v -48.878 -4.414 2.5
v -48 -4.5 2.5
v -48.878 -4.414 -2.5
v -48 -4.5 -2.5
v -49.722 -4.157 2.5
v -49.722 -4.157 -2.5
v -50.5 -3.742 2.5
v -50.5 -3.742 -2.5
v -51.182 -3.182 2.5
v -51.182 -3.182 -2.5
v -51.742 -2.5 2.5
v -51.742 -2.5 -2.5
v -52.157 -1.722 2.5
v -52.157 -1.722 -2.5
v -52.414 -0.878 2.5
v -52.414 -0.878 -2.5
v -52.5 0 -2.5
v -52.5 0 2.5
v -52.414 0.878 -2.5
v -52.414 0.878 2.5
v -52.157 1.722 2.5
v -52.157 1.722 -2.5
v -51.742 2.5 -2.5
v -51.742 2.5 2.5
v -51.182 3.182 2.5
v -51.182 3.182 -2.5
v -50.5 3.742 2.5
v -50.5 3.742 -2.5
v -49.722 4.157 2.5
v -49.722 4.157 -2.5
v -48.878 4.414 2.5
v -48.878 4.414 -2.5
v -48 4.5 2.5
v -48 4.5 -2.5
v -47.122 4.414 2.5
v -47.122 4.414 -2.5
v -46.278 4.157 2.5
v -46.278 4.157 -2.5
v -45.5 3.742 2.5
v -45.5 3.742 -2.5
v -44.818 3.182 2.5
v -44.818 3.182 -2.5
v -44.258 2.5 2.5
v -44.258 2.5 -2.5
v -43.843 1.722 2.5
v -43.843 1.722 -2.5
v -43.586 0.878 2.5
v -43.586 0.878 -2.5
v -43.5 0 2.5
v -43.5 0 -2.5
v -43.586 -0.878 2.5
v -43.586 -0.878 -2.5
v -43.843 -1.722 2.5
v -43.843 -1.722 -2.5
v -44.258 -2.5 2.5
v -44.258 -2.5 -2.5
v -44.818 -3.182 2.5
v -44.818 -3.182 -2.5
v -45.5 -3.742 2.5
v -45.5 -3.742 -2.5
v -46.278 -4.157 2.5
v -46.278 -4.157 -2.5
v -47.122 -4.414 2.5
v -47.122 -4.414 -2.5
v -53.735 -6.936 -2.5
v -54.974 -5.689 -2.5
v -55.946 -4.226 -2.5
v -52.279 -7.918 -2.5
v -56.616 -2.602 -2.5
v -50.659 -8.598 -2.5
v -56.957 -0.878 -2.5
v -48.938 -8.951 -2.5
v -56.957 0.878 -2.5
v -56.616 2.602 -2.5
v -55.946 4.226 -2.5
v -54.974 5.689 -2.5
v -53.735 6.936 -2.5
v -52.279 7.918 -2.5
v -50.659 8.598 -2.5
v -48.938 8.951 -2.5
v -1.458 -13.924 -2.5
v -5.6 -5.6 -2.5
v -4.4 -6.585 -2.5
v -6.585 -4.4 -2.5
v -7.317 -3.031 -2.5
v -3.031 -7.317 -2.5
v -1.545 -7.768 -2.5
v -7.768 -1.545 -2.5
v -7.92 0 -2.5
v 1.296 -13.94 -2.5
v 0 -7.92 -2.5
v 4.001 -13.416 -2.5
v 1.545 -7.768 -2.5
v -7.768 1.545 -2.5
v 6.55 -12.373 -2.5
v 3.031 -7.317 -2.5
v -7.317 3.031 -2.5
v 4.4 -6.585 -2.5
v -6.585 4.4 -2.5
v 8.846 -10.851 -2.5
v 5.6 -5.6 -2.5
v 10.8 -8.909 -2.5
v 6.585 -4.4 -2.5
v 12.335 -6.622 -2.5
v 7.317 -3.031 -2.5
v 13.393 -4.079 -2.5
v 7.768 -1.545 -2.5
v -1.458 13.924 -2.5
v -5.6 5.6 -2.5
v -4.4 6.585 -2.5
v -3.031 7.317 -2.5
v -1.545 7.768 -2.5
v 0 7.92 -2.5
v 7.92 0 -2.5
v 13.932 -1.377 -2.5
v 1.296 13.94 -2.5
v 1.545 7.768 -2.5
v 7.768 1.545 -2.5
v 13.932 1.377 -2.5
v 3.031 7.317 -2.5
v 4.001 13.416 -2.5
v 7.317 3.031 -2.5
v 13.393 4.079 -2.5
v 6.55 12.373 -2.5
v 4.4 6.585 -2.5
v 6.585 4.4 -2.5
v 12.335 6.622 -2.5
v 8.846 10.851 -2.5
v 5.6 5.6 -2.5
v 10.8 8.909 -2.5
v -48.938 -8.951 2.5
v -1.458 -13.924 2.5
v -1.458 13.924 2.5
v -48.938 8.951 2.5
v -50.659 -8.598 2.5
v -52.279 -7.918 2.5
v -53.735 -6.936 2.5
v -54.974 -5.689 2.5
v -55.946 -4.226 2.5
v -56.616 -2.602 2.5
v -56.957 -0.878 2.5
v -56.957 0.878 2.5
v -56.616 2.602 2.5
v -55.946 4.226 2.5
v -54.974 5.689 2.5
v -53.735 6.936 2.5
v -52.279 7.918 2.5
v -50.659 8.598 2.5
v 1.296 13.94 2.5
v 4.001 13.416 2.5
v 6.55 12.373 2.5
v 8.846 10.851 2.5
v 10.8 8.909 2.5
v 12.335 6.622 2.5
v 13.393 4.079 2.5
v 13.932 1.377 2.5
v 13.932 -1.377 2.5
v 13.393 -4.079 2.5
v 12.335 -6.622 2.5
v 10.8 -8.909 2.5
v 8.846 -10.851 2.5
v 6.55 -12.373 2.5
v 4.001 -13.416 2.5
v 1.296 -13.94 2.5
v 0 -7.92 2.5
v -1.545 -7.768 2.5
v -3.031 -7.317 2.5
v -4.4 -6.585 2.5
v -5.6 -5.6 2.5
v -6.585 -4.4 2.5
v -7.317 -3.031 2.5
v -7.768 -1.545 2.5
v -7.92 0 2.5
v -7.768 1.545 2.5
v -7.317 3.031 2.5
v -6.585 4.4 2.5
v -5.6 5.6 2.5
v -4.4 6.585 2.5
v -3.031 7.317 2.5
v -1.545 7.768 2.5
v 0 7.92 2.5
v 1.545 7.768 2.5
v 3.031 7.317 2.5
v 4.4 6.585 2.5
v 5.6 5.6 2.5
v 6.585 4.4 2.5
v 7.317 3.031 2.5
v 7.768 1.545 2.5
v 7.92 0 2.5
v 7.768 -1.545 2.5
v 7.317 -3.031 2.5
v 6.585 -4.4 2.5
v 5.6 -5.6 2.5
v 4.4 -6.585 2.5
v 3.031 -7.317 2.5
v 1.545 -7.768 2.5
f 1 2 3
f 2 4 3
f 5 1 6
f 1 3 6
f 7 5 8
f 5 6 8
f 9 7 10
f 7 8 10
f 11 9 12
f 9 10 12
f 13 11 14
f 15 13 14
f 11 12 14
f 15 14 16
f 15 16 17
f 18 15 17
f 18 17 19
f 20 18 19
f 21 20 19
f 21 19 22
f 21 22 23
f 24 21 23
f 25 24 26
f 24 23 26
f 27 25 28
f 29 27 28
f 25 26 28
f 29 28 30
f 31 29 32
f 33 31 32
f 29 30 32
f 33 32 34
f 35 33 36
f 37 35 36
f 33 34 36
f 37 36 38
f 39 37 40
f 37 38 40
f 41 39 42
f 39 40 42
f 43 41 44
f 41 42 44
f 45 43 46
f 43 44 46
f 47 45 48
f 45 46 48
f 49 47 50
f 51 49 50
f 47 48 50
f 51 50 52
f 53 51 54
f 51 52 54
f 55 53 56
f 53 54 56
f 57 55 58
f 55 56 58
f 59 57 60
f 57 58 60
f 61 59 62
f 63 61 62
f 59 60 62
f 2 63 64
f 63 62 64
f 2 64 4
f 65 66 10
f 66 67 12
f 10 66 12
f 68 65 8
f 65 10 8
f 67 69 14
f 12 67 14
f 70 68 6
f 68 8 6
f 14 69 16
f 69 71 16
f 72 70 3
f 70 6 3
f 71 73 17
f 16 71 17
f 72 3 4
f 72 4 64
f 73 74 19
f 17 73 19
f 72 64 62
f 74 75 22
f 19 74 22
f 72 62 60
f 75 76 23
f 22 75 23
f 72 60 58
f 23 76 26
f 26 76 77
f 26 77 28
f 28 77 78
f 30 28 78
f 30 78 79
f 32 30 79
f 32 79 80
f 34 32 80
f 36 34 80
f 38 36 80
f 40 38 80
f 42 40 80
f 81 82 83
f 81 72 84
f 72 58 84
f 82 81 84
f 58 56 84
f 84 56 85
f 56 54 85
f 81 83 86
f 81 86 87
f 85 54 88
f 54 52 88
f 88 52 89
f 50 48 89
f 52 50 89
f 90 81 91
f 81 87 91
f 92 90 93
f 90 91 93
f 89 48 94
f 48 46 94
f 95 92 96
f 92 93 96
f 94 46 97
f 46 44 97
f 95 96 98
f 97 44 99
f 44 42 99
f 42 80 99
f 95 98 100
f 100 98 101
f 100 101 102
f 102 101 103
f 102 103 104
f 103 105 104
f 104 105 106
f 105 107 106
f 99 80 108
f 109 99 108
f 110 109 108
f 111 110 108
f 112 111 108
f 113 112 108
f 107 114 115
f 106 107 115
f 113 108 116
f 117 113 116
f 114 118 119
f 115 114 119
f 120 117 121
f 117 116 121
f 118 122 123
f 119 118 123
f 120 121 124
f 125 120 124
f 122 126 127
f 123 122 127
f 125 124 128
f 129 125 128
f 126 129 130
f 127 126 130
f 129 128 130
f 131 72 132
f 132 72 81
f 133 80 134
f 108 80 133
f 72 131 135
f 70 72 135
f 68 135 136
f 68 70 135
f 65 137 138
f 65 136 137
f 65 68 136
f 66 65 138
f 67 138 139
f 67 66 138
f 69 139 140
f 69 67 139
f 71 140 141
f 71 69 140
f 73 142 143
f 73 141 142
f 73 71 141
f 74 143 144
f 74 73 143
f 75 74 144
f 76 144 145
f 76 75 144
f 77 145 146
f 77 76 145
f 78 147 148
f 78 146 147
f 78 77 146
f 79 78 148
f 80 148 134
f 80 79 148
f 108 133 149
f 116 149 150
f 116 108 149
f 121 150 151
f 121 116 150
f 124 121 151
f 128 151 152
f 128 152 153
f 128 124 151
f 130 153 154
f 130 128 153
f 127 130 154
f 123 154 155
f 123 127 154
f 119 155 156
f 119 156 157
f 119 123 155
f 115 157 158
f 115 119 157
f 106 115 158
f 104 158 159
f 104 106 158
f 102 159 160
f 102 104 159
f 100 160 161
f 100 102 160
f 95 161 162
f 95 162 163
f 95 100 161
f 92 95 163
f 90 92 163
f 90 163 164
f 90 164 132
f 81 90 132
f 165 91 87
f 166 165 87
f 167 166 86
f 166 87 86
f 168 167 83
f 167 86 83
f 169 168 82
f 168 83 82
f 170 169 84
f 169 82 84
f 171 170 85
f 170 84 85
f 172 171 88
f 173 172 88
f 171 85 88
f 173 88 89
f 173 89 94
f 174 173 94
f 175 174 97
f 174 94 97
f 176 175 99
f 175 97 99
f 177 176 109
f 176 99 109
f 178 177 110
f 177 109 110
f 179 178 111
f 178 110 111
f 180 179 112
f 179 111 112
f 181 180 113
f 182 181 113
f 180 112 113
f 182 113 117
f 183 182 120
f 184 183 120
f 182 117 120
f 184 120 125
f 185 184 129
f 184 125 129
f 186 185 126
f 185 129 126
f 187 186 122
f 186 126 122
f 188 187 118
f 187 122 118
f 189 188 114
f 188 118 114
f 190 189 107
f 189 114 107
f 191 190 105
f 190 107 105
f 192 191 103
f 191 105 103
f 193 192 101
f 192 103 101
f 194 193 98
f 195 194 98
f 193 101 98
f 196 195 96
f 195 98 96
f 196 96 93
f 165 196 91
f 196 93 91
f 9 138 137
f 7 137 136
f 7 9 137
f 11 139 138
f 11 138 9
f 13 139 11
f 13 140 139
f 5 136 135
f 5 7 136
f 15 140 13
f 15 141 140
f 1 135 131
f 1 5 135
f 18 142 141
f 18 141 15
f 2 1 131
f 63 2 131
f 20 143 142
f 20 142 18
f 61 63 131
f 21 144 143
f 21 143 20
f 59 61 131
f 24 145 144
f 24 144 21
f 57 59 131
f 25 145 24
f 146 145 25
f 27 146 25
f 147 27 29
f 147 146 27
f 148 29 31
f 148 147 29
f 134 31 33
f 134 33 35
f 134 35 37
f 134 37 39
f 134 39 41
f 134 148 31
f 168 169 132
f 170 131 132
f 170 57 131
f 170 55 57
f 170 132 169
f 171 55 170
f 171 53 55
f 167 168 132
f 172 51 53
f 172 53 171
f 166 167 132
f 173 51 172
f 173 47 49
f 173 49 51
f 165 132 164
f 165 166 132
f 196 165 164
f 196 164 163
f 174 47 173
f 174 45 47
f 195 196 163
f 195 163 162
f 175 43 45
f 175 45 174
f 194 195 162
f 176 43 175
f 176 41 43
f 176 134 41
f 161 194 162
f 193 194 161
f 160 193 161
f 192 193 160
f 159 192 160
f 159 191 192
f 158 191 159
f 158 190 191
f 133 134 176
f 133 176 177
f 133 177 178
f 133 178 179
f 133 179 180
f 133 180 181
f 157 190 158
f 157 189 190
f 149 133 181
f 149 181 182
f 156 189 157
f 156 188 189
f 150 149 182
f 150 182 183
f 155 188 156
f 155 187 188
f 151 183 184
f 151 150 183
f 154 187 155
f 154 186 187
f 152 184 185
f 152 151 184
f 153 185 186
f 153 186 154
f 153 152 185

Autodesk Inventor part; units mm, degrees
ref_plane "YZ Plane" through (0, 0, 0) normal (1, 0, 0) x (0, 1, 0)
ref_plane "XZ Plane" through (0, 0, 0) normal (0, 1, 0) x (-1, 0, 0)
sketch "Sketch1" plane through (0, 0, 0) normal (0, 0, 1) x (1, 0, 0)
  circle A0 centre (0, 0) radius 14
  line L0 (0, 0) -> (-48, 0) construction
  circle A1 centre (-48, 0) radius 9
  line L1 (-48.9375, 8.951) -> (-1.4583, 13.9238)
  line L2 (-48.9375, -8.951) -> (-1.4583, -13.9238)
  dimension "d0" = 18
  dimension "d1" = 28
  dimension "d2" = 48
extrude "Extrusion1" add sketch "Sketch1" along normal mid plane 5
sketch "Sketch2" plane through (0, 0, 2.5) normal (0, 0, 1) x (1, 0, 0)
  arc A0 (-1.4583, -13.9238) -> (-1.4583, 13.9238) centre (0, 0) ccw projected
hole "Hole1" at (0, 0, 2.5) direction (0, 0, -1) diameter 15.84 end through all
sketch "Sketch3" plane through (0, 0, 2.5) normal (0, 0, 1) x (1, 0, 0)
  arc A0 (-48.9375, 8.951) -> (-48.9375, -8.951) centre (-48, 0) ccw projected
hole "Hole2" at (-48, 0, 2.5) direction (0, 0, -1) diameter 9 end through all
properties part number "313-01-03" material "Steel"
